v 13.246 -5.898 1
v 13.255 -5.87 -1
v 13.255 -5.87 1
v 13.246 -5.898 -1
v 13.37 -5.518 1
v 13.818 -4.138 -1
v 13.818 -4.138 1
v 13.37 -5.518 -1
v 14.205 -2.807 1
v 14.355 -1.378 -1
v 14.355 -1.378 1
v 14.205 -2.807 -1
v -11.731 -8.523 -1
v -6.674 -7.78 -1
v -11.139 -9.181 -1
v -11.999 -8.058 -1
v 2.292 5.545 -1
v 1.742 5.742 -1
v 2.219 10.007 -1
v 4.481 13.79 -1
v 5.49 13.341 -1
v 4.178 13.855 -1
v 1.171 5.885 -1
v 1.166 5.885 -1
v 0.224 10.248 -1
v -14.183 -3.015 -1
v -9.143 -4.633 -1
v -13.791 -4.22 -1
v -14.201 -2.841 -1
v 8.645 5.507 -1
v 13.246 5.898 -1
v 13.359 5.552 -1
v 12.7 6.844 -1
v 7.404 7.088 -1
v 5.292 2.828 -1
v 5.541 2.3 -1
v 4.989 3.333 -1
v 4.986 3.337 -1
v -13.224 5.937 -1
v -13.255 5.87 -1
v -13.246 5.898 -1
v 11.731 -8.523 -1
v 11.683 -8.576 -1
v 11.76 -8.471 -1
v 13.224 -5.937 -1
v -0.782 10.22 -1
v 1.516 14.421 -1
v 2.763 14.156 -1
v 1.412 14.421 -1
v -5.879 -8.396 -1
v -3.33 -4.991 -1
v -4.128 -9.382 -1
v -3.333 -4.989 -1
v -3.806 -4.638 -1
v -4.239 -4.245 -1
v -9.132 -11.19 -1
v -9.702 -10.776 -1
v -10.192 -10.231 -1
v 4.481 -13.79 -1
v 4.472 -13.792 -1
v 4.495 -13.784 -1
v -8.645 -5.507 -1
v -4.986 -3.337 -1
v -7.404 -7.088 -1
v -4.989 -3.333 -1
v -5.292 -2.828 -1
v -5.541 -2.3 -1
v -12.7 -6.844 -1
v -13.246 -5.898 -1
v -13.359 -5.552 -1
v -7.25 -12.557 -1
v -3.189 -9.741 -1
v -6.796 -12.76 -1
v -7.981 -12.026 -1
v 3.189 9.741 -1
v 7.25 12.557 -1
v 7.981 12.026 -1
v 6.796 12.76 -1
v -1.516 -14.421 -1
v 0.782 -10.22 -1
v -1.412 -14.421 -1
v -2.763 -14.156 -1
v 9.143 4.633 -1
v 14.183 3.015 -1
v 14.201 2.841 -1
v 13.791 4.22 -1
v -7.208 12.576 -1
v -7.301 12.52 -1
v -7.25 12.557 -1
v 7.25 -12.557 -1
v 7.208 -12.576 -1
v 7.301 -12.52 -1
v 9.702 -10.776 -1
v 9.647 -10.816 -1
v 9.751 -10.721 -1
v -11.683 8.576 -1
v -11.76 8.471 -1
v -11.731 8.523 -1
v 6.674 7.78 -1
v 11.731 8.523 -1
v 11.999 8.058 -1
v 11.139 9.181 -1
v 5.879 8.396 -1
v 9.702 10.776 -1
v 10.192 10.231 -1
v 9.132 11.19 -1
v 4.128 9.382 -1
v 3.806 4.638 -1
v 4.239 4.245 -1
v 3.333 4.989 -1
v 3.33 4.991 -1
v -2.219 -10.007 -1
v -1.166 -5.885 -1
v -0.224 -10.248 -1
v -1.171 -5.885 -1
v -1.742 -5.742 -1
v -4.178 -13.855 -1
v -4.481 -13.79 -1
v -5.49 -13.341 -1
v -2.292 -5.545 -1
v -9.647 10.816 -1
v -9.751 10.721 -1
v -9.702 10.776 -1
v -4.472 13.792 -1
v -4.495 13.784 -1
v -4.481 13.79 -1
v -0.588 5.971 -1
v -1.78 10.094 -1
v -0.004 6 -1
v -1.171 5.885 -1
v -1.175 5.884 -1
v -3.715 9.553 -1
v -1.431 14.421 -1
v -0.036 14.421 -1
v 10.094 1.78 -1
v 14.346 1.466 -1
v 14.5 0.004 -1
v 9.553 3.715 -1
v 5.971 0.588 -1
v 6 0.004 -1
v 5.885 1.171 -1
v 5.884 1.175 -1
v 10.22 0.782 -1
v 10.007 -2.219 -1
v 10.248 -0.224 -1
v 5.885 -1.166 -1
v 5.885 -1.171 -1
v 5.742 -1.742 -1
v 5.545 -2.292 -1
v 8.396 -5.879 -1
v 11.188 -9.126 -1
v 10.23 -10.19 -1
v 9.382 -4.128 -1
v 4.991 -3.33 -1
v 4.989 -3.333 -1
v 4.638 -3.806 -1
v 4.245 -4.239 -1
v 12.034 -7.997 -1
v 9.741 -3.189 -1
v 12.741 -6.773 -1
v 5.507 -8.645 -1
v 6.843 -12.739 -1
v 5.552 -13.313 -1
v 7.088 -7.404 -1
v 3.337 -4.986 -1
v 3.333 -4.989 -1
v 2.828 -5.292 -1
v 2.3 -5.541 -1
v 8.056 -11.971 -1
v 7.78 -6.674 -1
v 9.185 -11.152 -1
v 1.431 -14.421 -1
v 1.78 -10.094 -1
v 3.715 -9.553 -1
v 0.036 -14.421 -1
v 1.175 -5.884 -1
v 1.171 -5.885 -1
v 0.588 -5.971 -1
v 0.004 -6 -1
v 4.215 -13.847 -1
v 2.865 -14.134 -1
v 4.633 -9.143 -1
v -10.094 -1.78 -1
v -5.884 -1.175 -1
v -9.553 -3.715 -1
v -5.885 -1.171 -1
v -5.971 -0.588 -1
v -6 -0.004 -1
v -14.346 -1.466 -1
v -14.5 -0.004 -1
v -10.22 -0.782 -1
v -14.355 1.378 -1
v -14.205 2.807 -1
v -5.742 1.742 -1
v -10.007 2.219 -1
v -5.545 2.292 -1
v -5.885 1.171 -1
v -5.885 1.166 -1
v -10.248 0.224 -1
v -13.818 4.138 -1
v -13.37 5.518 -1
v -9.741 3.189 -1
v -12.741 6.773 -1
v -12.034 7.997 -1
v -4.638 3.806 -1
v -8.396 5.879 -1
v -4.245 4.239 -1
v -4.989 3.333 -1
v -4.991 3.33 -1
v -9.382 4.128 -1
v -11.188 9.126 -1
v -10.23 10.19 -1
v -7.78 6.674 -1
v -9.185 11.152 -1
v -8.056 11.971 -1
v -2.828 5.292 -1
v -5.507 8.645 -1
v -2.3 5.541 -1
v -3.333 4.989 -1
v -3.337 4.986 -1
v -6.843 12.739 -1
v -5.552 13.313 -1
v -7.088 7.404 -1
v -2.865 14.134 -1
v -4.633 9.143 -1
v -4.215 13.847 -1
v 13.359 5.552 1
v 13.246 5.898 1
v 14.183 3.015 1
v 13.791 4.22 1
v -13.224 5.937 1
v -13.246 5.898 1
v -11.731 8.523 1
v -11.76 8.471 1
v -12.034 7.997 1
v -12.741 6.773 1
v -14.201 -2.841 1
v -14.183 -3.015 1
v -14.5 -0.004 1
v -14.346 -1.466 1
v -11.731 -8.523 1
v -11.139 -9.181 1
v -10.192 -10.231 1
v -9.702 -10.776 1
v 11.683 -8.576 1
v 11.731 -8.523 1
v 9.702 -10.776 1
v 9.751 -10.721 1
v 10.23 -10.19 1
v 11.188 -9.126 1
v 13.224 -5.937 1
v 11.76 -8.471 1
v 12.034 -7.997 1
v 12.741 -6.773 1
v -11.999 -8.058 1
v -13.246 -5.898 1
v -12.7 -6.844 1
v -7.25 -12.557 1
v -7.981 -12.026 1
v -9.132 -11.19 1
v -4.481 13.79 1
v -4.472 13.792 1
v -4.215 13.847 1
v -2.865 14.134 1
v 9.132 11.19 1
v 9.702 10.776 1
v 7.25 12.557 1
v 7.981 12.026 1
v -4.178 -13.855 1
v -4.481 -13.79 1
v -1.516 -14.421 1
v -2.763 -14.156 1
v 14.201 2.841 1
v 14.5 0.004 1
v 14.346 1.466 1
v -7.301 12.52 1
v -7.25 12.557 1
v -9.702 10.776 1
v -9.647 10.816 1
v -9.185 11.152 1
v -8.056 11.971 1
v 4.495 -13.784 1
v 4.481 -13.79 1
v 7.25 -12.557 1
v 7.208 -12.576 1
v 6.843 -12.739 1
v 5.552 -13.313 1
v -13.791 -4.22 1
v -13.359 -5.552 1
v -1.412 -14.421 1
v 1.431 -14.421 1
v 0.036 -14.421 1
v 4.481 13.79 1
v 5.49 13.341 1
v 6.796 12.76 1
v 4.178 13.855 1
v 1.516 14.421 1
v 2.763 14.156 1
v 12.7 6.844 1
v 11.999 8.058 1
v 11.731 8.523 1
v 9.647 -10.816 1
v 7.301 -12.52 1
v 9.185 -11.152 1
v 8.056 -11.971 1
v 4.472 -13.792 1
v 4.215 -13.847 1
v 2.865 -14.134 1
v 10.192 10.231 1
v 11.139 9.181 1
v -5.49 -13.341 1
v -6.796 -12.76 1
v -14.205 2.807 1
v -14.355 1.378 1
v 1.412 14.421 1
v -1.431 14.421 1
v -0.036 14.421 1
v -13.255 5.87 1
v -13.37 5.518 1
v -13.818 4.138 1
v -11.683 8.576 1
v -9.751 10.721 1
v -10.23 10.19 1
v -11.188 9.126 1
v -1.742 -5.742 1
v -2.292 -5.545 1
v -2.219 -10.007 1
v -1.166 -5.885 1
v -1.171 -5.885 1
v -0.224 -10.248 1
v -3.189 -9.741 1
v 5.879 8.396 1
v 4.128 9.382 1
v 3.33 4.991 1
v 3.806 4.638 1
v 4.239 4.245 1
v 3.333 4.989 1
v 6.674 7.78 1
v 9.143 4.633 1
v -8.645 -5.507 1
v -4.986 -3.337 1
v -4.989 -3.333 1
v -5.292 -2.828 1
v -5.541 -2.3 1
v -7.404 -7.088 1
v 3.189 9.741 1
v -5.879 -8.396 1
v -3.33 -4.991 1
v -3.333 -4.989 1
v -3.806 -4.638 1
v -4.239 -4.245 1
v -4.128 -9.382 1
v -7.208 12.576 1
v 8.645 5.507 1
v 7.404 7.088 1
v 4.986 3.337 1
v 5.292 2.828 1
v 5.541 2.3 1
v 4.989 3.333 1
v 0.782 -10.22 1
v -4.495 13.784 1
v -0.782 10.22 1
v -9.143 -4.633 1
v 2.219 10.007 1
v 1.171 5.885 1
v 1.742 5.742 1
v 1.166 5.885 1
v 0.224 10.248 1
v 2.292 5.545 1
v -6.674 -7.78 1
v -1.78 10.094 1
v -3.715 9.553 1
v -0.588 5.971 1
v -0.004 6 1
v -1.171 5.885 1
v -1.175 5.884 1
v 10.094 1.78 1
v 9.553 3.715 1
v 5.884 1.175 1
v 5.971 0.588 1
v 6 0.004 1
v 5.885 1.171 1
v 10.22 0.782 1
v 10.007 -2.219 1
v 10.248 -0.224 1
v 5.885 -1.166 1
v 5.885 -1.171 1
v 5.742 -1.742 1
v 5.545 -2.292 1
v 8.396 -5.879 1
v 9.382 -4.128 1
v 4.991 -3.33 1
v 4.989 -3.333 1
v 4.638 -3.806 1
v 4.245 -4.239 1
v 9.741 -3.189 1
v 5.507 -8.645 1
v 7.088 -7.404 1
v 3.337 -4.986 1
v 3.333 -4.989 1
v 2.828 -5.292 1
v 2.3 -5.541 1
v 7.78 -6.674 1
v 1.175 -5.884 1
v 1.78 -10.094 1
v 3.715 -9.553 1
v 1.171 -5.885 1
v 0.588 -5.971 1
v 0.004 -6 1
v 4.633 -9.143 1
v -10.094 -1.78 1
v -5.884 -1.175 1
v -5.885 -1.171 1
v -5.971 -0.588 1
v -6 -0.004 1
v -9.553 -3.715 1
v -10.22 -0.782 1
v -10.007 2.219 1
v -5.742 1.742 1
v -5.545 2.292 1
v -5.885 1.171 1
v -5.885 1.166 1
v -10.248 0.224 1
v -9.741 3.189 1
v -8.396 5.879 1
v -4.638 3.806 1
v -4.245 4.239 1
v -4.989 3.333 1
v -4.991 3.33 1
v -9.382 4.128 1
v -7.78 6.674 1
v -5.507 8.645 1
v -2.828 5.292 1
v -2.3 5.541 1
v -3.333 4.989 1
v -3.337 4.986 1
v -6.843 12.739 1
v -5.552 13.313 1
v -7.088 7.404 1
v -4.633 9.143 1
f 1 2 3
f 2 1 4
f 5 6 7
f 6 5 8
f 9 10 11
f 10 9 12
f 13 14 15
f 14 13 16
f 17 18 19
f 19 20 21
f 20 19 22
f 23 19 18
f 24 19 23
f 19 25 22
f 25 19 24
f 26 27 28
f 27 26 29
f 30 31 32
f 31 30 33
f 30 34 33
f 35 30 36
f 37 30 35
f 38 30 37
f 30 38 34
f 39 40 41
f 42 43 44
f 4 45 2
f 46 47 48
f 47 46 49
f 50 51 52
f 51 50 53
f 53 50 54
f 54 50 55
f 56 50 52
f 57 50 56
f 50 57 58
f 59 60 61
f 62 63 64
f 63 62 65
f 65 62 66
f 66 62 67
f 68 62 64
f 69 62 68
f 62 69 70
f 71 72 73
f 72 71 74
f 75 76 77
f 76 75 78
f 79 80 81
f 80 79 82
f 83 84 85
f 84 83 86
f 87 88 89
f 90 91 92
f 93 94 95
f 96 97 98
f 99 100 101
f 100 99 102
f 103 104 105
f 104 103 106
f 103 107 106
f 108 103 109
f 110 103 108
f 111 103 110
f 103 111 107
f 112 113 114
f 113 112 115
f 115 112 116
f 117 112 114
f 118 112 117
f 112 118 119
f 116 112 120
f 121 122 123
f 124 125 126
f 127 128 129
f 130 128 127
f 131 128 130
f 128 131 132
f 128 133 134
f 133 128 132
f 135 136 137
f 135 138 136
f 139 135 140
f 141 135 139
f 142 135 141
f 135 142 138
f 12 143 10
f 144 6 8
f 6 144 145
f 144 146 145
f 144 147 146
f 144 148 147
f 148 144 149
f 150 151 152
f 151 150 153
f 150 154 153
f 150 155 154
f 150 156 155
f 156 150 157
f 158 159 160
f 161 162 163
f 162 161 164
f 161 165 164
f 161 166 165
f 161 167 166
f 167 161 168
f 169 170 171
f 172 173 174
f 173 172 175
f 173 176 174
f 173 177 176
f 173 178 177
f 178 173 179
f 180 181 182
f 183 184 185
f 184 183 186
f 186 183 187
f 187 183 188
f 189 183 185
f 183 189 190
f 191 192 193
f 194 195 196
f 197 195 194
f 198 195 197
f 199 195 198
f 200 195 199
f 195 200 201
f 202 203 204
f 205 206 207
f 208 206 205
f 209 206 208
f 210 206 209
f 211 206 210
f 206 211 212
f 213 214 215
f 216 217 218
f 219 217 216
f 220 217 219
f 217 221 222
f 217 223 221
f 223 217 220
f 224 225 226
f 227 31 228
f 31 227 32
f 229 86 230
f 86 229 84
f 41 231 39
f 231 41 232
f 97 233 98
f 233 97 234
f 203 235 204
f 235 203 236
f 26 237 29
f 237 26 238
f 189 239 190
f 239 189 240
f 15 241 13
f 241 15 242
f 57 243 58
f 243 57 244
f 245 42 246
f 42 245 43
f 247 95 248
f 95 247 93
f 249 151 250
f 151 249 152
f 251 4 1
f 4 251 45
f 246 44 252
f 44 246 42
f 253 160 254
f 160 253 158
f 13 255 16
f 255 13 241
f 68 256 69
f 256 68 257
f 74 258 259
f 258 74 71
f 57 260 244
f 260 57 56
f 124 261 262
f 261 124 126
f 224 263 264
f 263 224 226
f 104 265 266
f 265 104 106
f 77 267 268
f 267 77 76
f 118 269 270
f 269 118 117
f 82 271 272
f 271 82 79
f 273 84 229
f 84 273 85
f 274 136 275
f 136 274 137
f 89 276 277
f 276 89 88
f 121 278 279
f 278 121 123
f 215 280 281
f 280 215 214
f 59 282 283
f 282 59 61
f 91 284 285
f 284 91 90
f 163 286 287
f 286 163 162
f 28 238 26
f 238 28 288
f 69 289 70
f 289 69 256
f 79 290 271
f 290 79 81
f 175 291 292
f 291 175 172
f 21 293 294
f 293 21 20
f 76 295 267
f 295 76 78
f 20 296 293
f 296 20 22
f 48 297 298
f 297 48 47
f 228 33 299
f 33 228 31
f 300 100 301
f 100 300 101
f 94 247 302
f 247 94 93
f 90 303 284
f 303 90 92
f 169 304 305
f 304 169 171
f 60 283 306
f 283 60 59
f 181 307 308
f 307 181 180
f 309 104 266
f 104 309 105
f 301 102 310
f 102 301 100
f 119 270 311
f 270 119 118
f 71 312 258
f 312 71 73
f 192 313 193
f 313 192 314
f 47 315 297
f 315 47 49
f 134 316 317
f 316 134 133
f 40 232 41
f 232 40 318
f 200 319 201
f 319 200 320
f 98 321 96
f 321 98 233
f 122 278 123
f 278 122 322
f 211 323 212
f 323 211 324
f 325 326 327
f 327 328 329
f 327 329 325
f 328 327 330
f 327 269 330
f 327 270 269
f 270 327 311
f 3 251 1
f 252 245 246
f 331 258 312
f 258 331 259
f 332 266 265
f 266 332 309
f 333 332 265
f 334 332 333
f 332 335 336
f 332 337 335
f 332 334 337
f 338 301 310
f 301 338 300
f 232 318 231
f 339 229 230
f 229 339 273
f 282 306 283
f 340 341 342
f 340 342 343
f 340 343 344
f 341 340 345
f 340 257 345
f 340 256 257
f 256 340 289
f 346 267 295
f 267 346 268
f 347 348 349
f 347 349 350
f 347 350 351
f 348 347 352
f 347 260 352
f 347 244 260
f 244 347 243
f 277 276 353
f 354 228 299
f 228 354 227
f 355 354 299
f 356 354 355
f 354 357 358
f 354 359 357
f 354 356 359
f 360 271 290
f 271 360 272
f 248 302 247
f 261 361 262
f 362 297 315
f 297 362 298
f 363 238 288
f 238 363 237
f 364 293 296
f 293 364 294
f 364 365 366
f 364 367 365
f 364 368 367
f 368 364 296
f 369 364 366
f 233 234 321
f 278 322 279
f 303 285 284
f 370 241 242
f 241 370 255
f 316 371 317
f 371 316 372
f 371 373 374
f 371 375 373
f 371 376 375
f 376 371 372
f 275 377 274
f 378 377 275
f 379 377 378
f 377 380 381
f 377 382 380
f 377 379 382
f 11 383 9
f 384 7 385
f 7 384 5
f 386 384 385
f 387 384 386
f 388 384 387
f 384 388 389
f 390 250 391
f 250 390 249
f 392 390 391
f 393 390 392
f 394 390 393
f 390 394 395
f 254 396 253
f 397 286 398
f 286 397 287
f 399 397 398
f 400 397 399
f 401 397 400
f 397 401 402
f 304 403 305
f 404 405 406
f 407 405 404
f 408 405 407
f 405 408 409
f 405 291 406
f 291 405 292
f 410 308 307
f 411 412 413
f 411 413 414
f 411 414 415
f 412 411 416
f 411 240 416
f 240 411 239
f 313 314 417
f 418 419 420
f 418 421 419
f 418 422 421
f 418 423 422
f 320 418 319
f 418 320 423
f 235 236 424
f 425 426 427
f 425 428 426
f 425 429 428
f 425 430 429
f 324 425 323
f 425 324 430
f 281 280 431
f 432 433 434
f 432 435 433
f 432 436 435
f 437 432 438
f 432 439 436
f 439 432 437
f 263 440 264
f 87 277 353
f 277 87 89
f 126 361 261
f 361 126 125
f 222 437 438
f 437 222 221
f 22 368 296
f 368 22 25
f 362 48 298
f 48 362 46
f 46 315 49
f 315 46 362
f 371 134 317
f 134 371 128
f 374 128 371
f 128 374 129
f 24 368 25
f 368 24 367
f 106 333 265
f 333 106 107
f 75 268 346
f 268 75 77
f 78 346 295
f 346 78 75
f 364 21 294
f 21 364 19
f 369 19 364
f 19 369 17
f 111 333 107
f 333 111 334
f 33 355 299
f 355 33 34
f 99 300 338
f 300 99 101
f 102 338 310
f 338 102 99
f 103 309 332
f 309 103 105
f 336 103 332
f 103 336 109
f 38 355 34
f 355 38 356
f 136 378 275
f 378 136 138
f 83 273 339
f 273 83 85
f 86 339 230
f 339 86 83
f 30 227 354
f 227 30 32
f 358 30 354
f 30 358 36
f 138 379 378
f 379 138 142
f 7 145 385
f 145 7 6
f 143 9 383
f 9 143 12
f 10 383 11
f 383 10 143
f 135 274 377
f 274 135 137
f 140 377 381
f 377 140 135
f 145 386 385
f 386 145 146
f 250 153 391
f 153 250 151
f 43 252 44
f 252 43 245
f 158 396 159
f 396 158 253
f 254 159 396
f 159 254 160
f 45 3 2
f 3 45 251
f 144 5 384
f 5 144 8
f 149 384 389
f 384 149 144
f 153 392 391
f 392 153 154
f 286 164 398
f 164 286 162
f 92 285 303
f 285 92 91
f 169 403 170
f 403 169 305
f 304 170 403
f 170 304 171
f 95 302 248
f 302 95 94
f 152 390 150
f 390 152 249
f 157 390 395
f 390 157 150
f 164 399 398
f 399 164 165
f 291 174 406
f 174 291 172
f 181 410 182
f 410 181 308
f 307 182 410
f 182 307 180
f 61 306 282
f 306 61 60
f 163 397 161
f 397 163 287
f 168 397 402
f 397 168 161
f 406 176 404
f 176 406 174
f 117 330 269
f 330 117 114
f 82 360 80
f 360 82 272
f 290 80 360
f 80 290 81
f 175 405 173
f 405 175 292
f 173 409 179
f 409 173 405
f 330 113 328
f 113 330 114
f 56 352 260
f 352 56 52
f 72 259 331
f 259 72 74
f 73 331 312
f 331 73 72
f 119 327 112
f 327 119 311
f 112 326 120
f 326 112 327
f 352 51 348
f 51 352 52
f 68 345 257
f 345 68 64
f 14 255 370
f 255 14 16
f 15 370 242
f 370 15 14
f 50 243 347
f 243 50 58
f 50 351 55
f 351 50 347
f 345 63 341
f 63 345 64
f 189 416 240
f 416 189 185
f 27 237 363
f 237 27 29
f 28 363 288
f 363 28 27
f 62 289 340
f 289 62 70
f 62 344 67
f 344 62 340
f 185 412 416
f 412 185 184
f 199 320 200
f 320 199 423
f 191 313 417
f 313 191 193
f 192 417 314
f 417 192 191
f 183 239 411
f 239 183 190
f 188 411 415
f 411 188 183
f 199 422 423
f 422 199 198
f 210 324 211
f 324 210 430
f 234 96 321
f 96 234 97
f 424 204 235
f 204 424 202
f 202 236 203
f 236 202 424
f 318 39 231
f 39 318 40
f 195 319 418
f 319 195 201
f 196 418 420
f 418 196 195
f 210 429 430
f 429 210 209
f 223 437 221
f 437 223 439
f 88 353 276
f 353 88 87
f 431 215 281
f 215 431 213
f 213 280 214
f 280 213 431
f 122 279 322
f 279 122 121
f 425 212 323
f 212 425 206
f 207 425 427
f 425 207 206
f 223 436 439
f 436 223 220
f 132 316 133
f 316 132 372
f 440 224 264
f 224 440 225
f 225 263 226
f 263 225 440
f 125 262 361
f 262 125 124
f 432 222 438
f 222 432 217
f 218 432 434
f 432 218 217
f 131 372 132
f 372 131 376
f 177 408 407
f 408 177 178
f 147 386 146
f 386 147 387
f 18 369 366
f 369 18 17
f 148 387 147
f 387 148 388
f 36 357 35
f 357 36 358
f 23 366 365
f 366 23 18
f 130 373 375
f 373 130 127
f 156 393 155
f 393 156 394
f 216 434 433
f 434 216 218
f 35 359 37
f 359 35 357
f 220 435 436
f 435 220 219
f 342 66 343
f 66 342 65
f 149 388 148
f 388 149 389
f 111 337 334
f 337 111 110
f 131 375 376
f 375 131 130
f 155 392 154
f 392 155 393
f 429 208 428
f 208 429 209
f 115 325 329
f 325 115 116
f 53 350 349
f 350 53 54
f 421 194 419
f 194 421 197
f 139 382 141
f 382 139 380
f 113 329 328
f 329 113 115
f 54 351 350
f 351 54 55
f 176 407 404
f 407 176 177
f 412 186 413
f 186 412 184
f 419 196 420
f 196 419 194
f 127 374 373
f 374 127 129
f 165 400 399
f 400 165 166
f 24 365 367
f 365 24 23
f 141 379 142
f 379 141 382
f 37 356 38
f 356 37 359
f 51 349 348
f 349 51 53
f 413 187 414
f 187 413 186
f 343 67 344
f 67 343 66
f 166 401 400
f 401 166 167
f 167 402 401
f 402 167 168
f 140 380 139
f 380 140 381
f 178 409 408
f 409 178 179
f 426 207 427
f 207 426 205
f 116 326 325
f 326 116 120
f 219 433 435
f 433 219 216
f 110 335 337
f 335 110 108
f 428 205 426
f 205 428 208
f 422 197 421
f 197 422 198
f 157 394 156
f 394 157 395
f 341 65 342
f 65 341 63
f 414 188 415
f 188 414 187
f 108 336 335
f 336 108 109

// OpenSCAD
// Start: lazy_union
default_5_default_5();
// End: lazy_union

// Modules.

// 'PartMaterial undef-default - default 5.0'
module default_5_default_5() {
  // 'None : _combine_solids_and_holes'
  union() {
    // '_combine_solids_and_holes'
    difference() {
      // 'default : _combine_solids_and_holes'
      union() {
        // 'core'
        multmatrix(m=[[1.0, 0.0, 0.0, 0.0], [0.0, -1.0, 0.0, 0.0], [0.0, 0.0, -1.0, 1.0], [0.0, 0.0, 0.0, 1.0]]) {
          // 'core : _combine_solids_and_holes'
          union() {
            // 'core'
            cylinder(h=2.0, r1=14.5, r2=14.5, center=false);
          }
        }
      }
      // 'default'
      multmatrix(m=[[1.0, 0.0, 0.0, 0.0], [0.0, 1.0, 0.0, 0.0], [0.0, 0.0, 1.0, -1.005], [0.0, 0.0, 0.0, 1.0]]) {
        // "('spoke', 0) : _combine_solids_and_holes"
        union() {
          // ('spoke', 0)
          linear_extrude(height=2.01, twist=0.0, slices=4, scale=[1.0, 1.0]) {
            polygon(points=[[0.0, 5.99], [-1.779893821086036, 10.094279468375133], [0.0, 14.51], [1.4222287061819243, 14.440130384013576], [-0.7819107386655111, 10.220132856120783], [2.830760572454021, 14.231194418650873], [4.2120306669622485, 13.88520427147435], [0.22360257160425148, 10.247560777569069], [1.1685910288766082, 5.87490382961535]]);
          }
        }
      }
      // 'default'
      multmatrix(m=[[0.9238795325112867, 0.38268343236508984, 0.0, 0.0], [-0.3826834323650898, 0.9238795325112867, 0.0, 0.0], [0.0, 0.0, 1.0, -1.005], [0.0, 0.0, 0.0, 1.0]]) {
        // "('spoke', 1) : _combine_solids_and_holes"
        union() {
          // ('spoke', 1)
          linear_extrude(height=2.01, twist=0.0, slices=4, scale=[1.0, 1.0]) {
            polygon(points=[[0.0, 5.99], [-1.779893821086036, 10.094279468375133], [0.0, 14.51], [1.4222287061819243, 14.440130384013576], [-0.7819107386655111, 10.220132856120783], [2.830760572454021, 14.231194418650873], [4.2120306669622485, 13.88520427147435], [0.22360257160425148, 10.247560777569069], [1.1685910288766082, 5.87490382961535]]);
          }
        }
      }
      // 'default'
      multmatrix(m=[[0.7071067811865475, 0.7071067811865475, 0.0, 0.0], [-0.7071067811865475, 0.7071067811865475, 0.0, 0.0], [0.0, 0.0, 1.0, -1.005], [0.0, 0.0, 0.0, 1.0]]) {
        // "('spoke', 2) : _combine_solids_and_holes"
        union() {
          // ('spoke', 2)
          linear_extrude(height=2.01, twist=0.0, slices=4, scale=[1.0, 1.0]) {
            polygon(points=[[0.0, 5.99], [-1.779893821086036, 10.094279468375133], [0.0, 14.51], [1.4222287061819243, 14.440130384013576], [-0.7819107386655111, 10.220132856120783], [2.830760572454021, 14.231194418650873], [4.2120306669622485, 13.88520427147435], [0.22360257160425148, 10.247560777569069], [1.1685910288766082, 5.87490382961535]]);
          }
        }
      }
      // 'default'
      multmatrix(m=[[0.3826834323650899, 0.9238795325112867, 0.0, 0.0], [-0.9238795325112867, 0.38268343236508984, 0.0, 0.0], [0.0, 0.0, 1.0, -1.005], [0.0, 0.0, 0.0, 1.0]]) {
        // "('spoke', 3) : _combine_solids_and_holes"
        union() {
          // ('spoke', 3)
          linear_extrude(height=2.01, twist=0.0, slices=4, scale=[1.0, 1.0]) {
            polygon(points=[[0.0, 5.99], [-1.779893821086036, 10.094279468375133], [0.0, 14.51], [1.4222287061819243, 14.440130384013576], [-0.7819107386655111, 10.220132856120783], [2.830760572454021, 14.231194418650873], [4.2120306669622485, 13.88520427147435], [0.22360257160425148, 10.247560777569069], [1.1685910288766082, 5.87490382961535]]);
          }
        }
      }
      // 'default'
      multmatrix(m=[[0.0, 1.0, 0.0, 0.0], [-1.0, 0.0, 0.0, 0.0], [0.0, 0.0, 1.0, -1.005], [0.0, 0.0, 0.0, 1.0]]) {
        // "('spoke', 4) : _combine_solids_and_holes"
        union() {
          // ('spoke', 4)
          linear_extrude(height=2.01, twist=0.0, slices=4, scale=[1.0, 1.0]) {
            polygon(points=[[0.0, 5.99], [-1.779893821086036, 10.094279468375133], [0.0, 14.51], [1.4222287061819243, 14.440130384013576], [-0.7819107386655111, 10.220132856120783], [2.830760572454021, 14.231194418650873], [4.2120306669622485, 13.88520427147435], [0.22360257160425148, 10.247560777569069], [1.1685910288766082, 5.87490382961535]]);
          }
        }
      }
      // 'default'
      multmatrix(m=[[-0.3826834323650898, 0.9238795325112867, 0.0, 0.0], [-0.9238795325112868, -0.3826834323650898, 0.0, 0.0], [0.0, 0.0, 1.0, -1.005], [0.0, 0.0, 0.0, 1.0]]) {
        // "('spoke', 5) : _combine_solids_and_holes"
        union() {
          // ('spoke', 5)
          linear_extrude(height=2.01, twist=0.0, slices=4, scale=[1.0, 1.0]) {
            polygon(points=[[0.0, 5.99], [-1.779893821086036, 10.094279468375133], [0.0, 14.51], [1.4222287061819243, 14.440130384013576], [-0.7819107386655111, 10.220132856120783], [2.830760572454021, 14.231194418650873], [4.2120306669622485, 13.88520427147435], [0.22360257160425148, 10.247560777569069], [1.1685910288766082, 5.87490382961535]]);
          }
        }
      }
      // 'default'
      multmatrix(m=[[-0.7071067811865475, 0.7071067811865476, 0.0, 0.0], [-0.7071067811865476, -0.7071067811865475, 0.0, 0.0], [0.0, 0.0, 1.0, -1.005], [0.0, 0.0, 0.0, 1.0]]) {
        // "('spoke', 6) : _combine_solids_and_holes"
        union() {
          // ('spoke', 6)
          linear_extrude(height=2.01, twist=0.0, slices=4, scale=[1.0, 1.0]) {
            polygon(points=[[0.0, 5.99], [-1.779893821086036, 10.094279468375133], [0.0, 14.51], [1.4222287061819243, 14.440130384013576], [-0.7819107386655111, 10.220132856120783], [2.830760572454021, 14.231194418650873], [4.2120306669622485, 13.88520427147435], [0.22360257160425148, 10.247560777569069], [1.1685910288766082, 5.87490382961535]]);
          }
        }
      }
      // 'default'
      multmatrix(m=[[-0.9238795325112867, 0.3826834323650899, 0.0, 0.0], [-0.3826834323650899, -0.9238795325112867, 0.0, 0.0], [0.0, 0.0, 1.0, -1.005], [0.0, 0.0, 0.0, 1.0]]) {
        // "('spoke', 7) : _combine_solids_and_holes"
        union() {
          // ('spoke', 7)
          linear_extrude(height=2.01, twist=0.0, slices=4, scale=[1.0, 1.0]) {
            polygon(points=[[0.0, 5.99], [-1.779893821086036, 10.094279468375133], [0.0, 14.51], [1.4222287061819243, 14.440130384013576], [-0.7819107386655111, 10.220132856120783], [2.830760572454021, 14.231194418650873], [4.2120306669622485, 13.88520427147435], [0.22360257160425148, 10.247560777569069], [1.1685910288766082, 5.87490382961535]]);
          }
        }
      }
      // 'default'
      multmatrix(m=[[-1.0, 0.0, 0.0, 0.0], [0.0, -1.0, 0.0, 0.0], [0.0, 0.0, 1.0, -1.005], [0.0, 0.0, 0.0, 1.0]]) {
        // "('spoke', 8) : _combine_solids_and_holes"
        union() {
          // ('spoke', 8)
          linear_extrude(height=2.01, twist=0.0, slices=4, scale=[1.0, 1.0]) {
            polygon(points=[[0.0, 5.99], [-1.779893821086036, 10.094279468375133], [0.0, 14.51], [1.4222287061819243, 14.440130384013576], [-0.7819107386655111, 10.220132856120783], [2.830760572454021, 14.231194418650873], [4.2120306669622485, 13.88520427147435], [0.22360257160425148, 10.247560777569069], [1.1685910288766082, 5.87490382961535]]);
          }
        }
      }
      // 'default'
      multmatrix(m=[[-0.9238795325112871, -0.38268343236508917, 0.0, 0.0], [0.38268343236508917, -0.9238795325112868, 0.0, 0.0], [0.0, 0.0, 1.0, -1.005], [0.0, 0.0, 0.0, 1.0]]) {
        // "('spoke', 9) : _combine_solids_and_holes"
        union() {
          // ('spoke', 9)
          linear_extrude(height=2.01, twist=0.0, slices=4, scale=[1.0, 1.0]) {
            polygon(points=[[0.0, 5.99], [-1.779893821086036, 10.094279468375133], [0.0, 14.51], [1.4222287061819243, 14.440130384013576], [-0.7819107386655111, 10.220132856120783], [2.830760572454021, 14.231194418650873], [4.2120306669622485, 13.88520427147435], [0.22360257160425148, 10.247560777569069], [1.1685910288766082, 5.87490382961535]]);
          }
        }
      }
      // 'default'
      multmatrix(m=[[-0.7071067811865477, -0.7071067811865474, 0.0, 0.0], [0.7071067811865474, -0.7071067811865476, 0.0, 0.0], [0.0, 0.0, 1.0, -1.005], [0.0, 0.0, 0.0, 1.0]]) {
        // "('spoke', 10) : _combine_solids_and_holes"
        union() {
          // ('spoke', 10)
          linear_extrude(height=2.01, twist=0.0, slices=4, scale=[1.0, 1.0]) {
            polygon(points=[[0.0, 5.99], [-1.779893821086036, 10.094279468375133], [0.0, 14.51], [1.4222287061819243, 14.440130384013576], [-0.7819107386655111, 10.220132856120783], [2.830760572454021, 14.231194418650873], [4.2120306669622485, 13.88520427147435], [0.22360257160425148, 10.247560777569069], [1.1685910288766082, 5.87490382961535]]);
          }
        }
      }
      // 'default'
      multmatrix(m=[[-0.3826834323650895, -0.9238795325112868, 0.0, 0.0], [0.9238795325112868, -0.3826834323650895, 0.0, 0.0], [0.0, 0.0, 1.0, -1.005], [0.0, 0.0, 0.0, 1.0]]) {
        // "('spoke', 11) : _combine_solids_and_holes"
        union() {
          // ('spoke', 11)
          linear_extrude(height=2.01, twist=0.0, slices=4, scale=[1.0, 1.0]) {
            polygon(points=[[0.0, 5.99], [-1.779893821086036, 10.094279468375133], [0.0, 14.51], [1.4222287061819243, 14.440130384013576], [-0.7819107386655111, 10.220132856120783], [2.830760572454021, 14.231194418650873], [4.2120306669622485, 13.88520427147435], [0.22360257160425148, 10.247560777569069], [1.1685910288766082, 5.87490382961535]]);
          }
        }
      }
      // 'default'
      multmatrix(m=[[0.0, -1.0, 0.0, 0.0], [1.0, 0.0, 0.0, 0.0], [0.0, 0.0, 1.0, -1.005], [0.0, 0.0, 0.0, 1.0]]) {
        // "('spoke', 12) : _combine_solids_and_holes"
        union() {
          // ('spoke', 12)
          linear_extrude(height=2.01, twist=0.0, slices=4, scale=[1.0, 1.0]) {
            polygon(points=[[0.0, 5.99], [-1.779893821086036, 10.094279468375133], [0.0, 14.51], [1.4222287061819243, 14.440130384013576], [-0.7819107386655111, 10.220132856120783], [2.830760572454021, 14.231194418650873], [4.2120306669622485, 13.88520427147435], [0.22360257160425148, 10.247560777569069], [1.1685910288766082, 5.87490382961535]]);
          }
        }
      }
      // 'default'
      multmatrix(m=[[0.38268343236509, -0.9238795325112866, 0.0, 0.0], [0.9238795325112867, 0.38268343236509, 0.0, 0.0], [0.0, 0.0, 1.0, -1.005], [0.0, 0.0, 0.0, 1.0]]) {
        // "('spoke', 13) : _combine_solids_and_holes"
        union() {
          // ('spoke', 13)
          linear_extrude(height=2.01, twist=0.0, slices=4, scale=[1.0, 1.0]) {
            polygon(points=[[0.0, 5.99], [-1.779893821086036, 10.094279468375133], [0.0, 14.51], [1.4222287061819243, 14.440130384013576], [-0.7819107386655111, 10.220132856120783], [2.830760572454021, 14.231194418650873], [4.2120306669622485, 13.88520427147435], [0.22360257160425148, 10.247560777569069], [1.1685910288766082, 5.87490382961535]]);
          }
        }
      }
      // 'default'
      multmatrix(m=[[0.7071067811865474, -0.7071067811865477, 0.0, 0.0], [0.7071067811865477, 0.7071067811865474, 0.0, 0.0], [0.0, 0.0, 1.0, -1.005], [0.0, 0.0, 0.0, 1.0]]) {
        // "('spoke', 14) : _combine_solids_and_holes"
        union() {
          // ('spoke', 14)
          linear_extrude(height=2.01, twist=0.0, slices=4, scale=[1.0, 1.0]) {
            polygon(points=[[0.0, 5.99], [-1.779893821086036, 10.094279468375133], [0.0, 14.51], [1.4222287061819243, 14.440130384013576], [-0.7819107386655111, 10.220132856120783], [2.830760572454021, 14.231194418650873], [4.2120306669622485, 13.88520427147435], [0.22360257160425148, 10.247560777569069], [1.1685910288766082, 5.87490382961535]]);
          }
        }
      }
      // 'default'
      multmatrix(m=[[0.9238795325112868, -0.38268343236508956, 0.0, 0.0], [0.38268343236508956, 0.9238795325112868, 0.0, 0.0], [0.0, 0.0, 1.0, -1.005], [0.0, 0.0, 0.0, 1.0]]) {
        // "('spoke', 15) : _combine_solids_and_holes"
        union() {
          // ('spoke', 15)
          linear_extrude(height=2.01, twist=0.0, slices=4, scale=[1.0, 1.0]) {
            polygon(points=[[0.0, 5.99], [-1.779893821086036, 10.094279468375133], [0.0, 14.51], [1.4222287061819243, 14.440130384013576], [-0.7819107386655111, 10.220132856120783], [2.830760572454021, 14.231194418650873], [4.2120306669622485, 13.88520427147435], [0.22360257160425148, 10.247560777569069], [1.1685910288766082, 5.87490382961535]]);
          }
        }
      }
      // 'default'
      multmatrix(m=[[1.0, 0.0, 0.0, 0.0], [0.0, -1.0, 0.0, 0.0], [0.0, 0.0, -1.0, 1.005], [0.0, 0.0, 0.0, 1.0]]) {
        // 'inner_core : _combine_solids_and_holes'
        union() {
          // 'inner_core'
          cylinder(h=2.01, r1=6.0, r2=6.0, center=false, $fn=64);
        }
      }
    }
  }
} // end module default_5_default_5
